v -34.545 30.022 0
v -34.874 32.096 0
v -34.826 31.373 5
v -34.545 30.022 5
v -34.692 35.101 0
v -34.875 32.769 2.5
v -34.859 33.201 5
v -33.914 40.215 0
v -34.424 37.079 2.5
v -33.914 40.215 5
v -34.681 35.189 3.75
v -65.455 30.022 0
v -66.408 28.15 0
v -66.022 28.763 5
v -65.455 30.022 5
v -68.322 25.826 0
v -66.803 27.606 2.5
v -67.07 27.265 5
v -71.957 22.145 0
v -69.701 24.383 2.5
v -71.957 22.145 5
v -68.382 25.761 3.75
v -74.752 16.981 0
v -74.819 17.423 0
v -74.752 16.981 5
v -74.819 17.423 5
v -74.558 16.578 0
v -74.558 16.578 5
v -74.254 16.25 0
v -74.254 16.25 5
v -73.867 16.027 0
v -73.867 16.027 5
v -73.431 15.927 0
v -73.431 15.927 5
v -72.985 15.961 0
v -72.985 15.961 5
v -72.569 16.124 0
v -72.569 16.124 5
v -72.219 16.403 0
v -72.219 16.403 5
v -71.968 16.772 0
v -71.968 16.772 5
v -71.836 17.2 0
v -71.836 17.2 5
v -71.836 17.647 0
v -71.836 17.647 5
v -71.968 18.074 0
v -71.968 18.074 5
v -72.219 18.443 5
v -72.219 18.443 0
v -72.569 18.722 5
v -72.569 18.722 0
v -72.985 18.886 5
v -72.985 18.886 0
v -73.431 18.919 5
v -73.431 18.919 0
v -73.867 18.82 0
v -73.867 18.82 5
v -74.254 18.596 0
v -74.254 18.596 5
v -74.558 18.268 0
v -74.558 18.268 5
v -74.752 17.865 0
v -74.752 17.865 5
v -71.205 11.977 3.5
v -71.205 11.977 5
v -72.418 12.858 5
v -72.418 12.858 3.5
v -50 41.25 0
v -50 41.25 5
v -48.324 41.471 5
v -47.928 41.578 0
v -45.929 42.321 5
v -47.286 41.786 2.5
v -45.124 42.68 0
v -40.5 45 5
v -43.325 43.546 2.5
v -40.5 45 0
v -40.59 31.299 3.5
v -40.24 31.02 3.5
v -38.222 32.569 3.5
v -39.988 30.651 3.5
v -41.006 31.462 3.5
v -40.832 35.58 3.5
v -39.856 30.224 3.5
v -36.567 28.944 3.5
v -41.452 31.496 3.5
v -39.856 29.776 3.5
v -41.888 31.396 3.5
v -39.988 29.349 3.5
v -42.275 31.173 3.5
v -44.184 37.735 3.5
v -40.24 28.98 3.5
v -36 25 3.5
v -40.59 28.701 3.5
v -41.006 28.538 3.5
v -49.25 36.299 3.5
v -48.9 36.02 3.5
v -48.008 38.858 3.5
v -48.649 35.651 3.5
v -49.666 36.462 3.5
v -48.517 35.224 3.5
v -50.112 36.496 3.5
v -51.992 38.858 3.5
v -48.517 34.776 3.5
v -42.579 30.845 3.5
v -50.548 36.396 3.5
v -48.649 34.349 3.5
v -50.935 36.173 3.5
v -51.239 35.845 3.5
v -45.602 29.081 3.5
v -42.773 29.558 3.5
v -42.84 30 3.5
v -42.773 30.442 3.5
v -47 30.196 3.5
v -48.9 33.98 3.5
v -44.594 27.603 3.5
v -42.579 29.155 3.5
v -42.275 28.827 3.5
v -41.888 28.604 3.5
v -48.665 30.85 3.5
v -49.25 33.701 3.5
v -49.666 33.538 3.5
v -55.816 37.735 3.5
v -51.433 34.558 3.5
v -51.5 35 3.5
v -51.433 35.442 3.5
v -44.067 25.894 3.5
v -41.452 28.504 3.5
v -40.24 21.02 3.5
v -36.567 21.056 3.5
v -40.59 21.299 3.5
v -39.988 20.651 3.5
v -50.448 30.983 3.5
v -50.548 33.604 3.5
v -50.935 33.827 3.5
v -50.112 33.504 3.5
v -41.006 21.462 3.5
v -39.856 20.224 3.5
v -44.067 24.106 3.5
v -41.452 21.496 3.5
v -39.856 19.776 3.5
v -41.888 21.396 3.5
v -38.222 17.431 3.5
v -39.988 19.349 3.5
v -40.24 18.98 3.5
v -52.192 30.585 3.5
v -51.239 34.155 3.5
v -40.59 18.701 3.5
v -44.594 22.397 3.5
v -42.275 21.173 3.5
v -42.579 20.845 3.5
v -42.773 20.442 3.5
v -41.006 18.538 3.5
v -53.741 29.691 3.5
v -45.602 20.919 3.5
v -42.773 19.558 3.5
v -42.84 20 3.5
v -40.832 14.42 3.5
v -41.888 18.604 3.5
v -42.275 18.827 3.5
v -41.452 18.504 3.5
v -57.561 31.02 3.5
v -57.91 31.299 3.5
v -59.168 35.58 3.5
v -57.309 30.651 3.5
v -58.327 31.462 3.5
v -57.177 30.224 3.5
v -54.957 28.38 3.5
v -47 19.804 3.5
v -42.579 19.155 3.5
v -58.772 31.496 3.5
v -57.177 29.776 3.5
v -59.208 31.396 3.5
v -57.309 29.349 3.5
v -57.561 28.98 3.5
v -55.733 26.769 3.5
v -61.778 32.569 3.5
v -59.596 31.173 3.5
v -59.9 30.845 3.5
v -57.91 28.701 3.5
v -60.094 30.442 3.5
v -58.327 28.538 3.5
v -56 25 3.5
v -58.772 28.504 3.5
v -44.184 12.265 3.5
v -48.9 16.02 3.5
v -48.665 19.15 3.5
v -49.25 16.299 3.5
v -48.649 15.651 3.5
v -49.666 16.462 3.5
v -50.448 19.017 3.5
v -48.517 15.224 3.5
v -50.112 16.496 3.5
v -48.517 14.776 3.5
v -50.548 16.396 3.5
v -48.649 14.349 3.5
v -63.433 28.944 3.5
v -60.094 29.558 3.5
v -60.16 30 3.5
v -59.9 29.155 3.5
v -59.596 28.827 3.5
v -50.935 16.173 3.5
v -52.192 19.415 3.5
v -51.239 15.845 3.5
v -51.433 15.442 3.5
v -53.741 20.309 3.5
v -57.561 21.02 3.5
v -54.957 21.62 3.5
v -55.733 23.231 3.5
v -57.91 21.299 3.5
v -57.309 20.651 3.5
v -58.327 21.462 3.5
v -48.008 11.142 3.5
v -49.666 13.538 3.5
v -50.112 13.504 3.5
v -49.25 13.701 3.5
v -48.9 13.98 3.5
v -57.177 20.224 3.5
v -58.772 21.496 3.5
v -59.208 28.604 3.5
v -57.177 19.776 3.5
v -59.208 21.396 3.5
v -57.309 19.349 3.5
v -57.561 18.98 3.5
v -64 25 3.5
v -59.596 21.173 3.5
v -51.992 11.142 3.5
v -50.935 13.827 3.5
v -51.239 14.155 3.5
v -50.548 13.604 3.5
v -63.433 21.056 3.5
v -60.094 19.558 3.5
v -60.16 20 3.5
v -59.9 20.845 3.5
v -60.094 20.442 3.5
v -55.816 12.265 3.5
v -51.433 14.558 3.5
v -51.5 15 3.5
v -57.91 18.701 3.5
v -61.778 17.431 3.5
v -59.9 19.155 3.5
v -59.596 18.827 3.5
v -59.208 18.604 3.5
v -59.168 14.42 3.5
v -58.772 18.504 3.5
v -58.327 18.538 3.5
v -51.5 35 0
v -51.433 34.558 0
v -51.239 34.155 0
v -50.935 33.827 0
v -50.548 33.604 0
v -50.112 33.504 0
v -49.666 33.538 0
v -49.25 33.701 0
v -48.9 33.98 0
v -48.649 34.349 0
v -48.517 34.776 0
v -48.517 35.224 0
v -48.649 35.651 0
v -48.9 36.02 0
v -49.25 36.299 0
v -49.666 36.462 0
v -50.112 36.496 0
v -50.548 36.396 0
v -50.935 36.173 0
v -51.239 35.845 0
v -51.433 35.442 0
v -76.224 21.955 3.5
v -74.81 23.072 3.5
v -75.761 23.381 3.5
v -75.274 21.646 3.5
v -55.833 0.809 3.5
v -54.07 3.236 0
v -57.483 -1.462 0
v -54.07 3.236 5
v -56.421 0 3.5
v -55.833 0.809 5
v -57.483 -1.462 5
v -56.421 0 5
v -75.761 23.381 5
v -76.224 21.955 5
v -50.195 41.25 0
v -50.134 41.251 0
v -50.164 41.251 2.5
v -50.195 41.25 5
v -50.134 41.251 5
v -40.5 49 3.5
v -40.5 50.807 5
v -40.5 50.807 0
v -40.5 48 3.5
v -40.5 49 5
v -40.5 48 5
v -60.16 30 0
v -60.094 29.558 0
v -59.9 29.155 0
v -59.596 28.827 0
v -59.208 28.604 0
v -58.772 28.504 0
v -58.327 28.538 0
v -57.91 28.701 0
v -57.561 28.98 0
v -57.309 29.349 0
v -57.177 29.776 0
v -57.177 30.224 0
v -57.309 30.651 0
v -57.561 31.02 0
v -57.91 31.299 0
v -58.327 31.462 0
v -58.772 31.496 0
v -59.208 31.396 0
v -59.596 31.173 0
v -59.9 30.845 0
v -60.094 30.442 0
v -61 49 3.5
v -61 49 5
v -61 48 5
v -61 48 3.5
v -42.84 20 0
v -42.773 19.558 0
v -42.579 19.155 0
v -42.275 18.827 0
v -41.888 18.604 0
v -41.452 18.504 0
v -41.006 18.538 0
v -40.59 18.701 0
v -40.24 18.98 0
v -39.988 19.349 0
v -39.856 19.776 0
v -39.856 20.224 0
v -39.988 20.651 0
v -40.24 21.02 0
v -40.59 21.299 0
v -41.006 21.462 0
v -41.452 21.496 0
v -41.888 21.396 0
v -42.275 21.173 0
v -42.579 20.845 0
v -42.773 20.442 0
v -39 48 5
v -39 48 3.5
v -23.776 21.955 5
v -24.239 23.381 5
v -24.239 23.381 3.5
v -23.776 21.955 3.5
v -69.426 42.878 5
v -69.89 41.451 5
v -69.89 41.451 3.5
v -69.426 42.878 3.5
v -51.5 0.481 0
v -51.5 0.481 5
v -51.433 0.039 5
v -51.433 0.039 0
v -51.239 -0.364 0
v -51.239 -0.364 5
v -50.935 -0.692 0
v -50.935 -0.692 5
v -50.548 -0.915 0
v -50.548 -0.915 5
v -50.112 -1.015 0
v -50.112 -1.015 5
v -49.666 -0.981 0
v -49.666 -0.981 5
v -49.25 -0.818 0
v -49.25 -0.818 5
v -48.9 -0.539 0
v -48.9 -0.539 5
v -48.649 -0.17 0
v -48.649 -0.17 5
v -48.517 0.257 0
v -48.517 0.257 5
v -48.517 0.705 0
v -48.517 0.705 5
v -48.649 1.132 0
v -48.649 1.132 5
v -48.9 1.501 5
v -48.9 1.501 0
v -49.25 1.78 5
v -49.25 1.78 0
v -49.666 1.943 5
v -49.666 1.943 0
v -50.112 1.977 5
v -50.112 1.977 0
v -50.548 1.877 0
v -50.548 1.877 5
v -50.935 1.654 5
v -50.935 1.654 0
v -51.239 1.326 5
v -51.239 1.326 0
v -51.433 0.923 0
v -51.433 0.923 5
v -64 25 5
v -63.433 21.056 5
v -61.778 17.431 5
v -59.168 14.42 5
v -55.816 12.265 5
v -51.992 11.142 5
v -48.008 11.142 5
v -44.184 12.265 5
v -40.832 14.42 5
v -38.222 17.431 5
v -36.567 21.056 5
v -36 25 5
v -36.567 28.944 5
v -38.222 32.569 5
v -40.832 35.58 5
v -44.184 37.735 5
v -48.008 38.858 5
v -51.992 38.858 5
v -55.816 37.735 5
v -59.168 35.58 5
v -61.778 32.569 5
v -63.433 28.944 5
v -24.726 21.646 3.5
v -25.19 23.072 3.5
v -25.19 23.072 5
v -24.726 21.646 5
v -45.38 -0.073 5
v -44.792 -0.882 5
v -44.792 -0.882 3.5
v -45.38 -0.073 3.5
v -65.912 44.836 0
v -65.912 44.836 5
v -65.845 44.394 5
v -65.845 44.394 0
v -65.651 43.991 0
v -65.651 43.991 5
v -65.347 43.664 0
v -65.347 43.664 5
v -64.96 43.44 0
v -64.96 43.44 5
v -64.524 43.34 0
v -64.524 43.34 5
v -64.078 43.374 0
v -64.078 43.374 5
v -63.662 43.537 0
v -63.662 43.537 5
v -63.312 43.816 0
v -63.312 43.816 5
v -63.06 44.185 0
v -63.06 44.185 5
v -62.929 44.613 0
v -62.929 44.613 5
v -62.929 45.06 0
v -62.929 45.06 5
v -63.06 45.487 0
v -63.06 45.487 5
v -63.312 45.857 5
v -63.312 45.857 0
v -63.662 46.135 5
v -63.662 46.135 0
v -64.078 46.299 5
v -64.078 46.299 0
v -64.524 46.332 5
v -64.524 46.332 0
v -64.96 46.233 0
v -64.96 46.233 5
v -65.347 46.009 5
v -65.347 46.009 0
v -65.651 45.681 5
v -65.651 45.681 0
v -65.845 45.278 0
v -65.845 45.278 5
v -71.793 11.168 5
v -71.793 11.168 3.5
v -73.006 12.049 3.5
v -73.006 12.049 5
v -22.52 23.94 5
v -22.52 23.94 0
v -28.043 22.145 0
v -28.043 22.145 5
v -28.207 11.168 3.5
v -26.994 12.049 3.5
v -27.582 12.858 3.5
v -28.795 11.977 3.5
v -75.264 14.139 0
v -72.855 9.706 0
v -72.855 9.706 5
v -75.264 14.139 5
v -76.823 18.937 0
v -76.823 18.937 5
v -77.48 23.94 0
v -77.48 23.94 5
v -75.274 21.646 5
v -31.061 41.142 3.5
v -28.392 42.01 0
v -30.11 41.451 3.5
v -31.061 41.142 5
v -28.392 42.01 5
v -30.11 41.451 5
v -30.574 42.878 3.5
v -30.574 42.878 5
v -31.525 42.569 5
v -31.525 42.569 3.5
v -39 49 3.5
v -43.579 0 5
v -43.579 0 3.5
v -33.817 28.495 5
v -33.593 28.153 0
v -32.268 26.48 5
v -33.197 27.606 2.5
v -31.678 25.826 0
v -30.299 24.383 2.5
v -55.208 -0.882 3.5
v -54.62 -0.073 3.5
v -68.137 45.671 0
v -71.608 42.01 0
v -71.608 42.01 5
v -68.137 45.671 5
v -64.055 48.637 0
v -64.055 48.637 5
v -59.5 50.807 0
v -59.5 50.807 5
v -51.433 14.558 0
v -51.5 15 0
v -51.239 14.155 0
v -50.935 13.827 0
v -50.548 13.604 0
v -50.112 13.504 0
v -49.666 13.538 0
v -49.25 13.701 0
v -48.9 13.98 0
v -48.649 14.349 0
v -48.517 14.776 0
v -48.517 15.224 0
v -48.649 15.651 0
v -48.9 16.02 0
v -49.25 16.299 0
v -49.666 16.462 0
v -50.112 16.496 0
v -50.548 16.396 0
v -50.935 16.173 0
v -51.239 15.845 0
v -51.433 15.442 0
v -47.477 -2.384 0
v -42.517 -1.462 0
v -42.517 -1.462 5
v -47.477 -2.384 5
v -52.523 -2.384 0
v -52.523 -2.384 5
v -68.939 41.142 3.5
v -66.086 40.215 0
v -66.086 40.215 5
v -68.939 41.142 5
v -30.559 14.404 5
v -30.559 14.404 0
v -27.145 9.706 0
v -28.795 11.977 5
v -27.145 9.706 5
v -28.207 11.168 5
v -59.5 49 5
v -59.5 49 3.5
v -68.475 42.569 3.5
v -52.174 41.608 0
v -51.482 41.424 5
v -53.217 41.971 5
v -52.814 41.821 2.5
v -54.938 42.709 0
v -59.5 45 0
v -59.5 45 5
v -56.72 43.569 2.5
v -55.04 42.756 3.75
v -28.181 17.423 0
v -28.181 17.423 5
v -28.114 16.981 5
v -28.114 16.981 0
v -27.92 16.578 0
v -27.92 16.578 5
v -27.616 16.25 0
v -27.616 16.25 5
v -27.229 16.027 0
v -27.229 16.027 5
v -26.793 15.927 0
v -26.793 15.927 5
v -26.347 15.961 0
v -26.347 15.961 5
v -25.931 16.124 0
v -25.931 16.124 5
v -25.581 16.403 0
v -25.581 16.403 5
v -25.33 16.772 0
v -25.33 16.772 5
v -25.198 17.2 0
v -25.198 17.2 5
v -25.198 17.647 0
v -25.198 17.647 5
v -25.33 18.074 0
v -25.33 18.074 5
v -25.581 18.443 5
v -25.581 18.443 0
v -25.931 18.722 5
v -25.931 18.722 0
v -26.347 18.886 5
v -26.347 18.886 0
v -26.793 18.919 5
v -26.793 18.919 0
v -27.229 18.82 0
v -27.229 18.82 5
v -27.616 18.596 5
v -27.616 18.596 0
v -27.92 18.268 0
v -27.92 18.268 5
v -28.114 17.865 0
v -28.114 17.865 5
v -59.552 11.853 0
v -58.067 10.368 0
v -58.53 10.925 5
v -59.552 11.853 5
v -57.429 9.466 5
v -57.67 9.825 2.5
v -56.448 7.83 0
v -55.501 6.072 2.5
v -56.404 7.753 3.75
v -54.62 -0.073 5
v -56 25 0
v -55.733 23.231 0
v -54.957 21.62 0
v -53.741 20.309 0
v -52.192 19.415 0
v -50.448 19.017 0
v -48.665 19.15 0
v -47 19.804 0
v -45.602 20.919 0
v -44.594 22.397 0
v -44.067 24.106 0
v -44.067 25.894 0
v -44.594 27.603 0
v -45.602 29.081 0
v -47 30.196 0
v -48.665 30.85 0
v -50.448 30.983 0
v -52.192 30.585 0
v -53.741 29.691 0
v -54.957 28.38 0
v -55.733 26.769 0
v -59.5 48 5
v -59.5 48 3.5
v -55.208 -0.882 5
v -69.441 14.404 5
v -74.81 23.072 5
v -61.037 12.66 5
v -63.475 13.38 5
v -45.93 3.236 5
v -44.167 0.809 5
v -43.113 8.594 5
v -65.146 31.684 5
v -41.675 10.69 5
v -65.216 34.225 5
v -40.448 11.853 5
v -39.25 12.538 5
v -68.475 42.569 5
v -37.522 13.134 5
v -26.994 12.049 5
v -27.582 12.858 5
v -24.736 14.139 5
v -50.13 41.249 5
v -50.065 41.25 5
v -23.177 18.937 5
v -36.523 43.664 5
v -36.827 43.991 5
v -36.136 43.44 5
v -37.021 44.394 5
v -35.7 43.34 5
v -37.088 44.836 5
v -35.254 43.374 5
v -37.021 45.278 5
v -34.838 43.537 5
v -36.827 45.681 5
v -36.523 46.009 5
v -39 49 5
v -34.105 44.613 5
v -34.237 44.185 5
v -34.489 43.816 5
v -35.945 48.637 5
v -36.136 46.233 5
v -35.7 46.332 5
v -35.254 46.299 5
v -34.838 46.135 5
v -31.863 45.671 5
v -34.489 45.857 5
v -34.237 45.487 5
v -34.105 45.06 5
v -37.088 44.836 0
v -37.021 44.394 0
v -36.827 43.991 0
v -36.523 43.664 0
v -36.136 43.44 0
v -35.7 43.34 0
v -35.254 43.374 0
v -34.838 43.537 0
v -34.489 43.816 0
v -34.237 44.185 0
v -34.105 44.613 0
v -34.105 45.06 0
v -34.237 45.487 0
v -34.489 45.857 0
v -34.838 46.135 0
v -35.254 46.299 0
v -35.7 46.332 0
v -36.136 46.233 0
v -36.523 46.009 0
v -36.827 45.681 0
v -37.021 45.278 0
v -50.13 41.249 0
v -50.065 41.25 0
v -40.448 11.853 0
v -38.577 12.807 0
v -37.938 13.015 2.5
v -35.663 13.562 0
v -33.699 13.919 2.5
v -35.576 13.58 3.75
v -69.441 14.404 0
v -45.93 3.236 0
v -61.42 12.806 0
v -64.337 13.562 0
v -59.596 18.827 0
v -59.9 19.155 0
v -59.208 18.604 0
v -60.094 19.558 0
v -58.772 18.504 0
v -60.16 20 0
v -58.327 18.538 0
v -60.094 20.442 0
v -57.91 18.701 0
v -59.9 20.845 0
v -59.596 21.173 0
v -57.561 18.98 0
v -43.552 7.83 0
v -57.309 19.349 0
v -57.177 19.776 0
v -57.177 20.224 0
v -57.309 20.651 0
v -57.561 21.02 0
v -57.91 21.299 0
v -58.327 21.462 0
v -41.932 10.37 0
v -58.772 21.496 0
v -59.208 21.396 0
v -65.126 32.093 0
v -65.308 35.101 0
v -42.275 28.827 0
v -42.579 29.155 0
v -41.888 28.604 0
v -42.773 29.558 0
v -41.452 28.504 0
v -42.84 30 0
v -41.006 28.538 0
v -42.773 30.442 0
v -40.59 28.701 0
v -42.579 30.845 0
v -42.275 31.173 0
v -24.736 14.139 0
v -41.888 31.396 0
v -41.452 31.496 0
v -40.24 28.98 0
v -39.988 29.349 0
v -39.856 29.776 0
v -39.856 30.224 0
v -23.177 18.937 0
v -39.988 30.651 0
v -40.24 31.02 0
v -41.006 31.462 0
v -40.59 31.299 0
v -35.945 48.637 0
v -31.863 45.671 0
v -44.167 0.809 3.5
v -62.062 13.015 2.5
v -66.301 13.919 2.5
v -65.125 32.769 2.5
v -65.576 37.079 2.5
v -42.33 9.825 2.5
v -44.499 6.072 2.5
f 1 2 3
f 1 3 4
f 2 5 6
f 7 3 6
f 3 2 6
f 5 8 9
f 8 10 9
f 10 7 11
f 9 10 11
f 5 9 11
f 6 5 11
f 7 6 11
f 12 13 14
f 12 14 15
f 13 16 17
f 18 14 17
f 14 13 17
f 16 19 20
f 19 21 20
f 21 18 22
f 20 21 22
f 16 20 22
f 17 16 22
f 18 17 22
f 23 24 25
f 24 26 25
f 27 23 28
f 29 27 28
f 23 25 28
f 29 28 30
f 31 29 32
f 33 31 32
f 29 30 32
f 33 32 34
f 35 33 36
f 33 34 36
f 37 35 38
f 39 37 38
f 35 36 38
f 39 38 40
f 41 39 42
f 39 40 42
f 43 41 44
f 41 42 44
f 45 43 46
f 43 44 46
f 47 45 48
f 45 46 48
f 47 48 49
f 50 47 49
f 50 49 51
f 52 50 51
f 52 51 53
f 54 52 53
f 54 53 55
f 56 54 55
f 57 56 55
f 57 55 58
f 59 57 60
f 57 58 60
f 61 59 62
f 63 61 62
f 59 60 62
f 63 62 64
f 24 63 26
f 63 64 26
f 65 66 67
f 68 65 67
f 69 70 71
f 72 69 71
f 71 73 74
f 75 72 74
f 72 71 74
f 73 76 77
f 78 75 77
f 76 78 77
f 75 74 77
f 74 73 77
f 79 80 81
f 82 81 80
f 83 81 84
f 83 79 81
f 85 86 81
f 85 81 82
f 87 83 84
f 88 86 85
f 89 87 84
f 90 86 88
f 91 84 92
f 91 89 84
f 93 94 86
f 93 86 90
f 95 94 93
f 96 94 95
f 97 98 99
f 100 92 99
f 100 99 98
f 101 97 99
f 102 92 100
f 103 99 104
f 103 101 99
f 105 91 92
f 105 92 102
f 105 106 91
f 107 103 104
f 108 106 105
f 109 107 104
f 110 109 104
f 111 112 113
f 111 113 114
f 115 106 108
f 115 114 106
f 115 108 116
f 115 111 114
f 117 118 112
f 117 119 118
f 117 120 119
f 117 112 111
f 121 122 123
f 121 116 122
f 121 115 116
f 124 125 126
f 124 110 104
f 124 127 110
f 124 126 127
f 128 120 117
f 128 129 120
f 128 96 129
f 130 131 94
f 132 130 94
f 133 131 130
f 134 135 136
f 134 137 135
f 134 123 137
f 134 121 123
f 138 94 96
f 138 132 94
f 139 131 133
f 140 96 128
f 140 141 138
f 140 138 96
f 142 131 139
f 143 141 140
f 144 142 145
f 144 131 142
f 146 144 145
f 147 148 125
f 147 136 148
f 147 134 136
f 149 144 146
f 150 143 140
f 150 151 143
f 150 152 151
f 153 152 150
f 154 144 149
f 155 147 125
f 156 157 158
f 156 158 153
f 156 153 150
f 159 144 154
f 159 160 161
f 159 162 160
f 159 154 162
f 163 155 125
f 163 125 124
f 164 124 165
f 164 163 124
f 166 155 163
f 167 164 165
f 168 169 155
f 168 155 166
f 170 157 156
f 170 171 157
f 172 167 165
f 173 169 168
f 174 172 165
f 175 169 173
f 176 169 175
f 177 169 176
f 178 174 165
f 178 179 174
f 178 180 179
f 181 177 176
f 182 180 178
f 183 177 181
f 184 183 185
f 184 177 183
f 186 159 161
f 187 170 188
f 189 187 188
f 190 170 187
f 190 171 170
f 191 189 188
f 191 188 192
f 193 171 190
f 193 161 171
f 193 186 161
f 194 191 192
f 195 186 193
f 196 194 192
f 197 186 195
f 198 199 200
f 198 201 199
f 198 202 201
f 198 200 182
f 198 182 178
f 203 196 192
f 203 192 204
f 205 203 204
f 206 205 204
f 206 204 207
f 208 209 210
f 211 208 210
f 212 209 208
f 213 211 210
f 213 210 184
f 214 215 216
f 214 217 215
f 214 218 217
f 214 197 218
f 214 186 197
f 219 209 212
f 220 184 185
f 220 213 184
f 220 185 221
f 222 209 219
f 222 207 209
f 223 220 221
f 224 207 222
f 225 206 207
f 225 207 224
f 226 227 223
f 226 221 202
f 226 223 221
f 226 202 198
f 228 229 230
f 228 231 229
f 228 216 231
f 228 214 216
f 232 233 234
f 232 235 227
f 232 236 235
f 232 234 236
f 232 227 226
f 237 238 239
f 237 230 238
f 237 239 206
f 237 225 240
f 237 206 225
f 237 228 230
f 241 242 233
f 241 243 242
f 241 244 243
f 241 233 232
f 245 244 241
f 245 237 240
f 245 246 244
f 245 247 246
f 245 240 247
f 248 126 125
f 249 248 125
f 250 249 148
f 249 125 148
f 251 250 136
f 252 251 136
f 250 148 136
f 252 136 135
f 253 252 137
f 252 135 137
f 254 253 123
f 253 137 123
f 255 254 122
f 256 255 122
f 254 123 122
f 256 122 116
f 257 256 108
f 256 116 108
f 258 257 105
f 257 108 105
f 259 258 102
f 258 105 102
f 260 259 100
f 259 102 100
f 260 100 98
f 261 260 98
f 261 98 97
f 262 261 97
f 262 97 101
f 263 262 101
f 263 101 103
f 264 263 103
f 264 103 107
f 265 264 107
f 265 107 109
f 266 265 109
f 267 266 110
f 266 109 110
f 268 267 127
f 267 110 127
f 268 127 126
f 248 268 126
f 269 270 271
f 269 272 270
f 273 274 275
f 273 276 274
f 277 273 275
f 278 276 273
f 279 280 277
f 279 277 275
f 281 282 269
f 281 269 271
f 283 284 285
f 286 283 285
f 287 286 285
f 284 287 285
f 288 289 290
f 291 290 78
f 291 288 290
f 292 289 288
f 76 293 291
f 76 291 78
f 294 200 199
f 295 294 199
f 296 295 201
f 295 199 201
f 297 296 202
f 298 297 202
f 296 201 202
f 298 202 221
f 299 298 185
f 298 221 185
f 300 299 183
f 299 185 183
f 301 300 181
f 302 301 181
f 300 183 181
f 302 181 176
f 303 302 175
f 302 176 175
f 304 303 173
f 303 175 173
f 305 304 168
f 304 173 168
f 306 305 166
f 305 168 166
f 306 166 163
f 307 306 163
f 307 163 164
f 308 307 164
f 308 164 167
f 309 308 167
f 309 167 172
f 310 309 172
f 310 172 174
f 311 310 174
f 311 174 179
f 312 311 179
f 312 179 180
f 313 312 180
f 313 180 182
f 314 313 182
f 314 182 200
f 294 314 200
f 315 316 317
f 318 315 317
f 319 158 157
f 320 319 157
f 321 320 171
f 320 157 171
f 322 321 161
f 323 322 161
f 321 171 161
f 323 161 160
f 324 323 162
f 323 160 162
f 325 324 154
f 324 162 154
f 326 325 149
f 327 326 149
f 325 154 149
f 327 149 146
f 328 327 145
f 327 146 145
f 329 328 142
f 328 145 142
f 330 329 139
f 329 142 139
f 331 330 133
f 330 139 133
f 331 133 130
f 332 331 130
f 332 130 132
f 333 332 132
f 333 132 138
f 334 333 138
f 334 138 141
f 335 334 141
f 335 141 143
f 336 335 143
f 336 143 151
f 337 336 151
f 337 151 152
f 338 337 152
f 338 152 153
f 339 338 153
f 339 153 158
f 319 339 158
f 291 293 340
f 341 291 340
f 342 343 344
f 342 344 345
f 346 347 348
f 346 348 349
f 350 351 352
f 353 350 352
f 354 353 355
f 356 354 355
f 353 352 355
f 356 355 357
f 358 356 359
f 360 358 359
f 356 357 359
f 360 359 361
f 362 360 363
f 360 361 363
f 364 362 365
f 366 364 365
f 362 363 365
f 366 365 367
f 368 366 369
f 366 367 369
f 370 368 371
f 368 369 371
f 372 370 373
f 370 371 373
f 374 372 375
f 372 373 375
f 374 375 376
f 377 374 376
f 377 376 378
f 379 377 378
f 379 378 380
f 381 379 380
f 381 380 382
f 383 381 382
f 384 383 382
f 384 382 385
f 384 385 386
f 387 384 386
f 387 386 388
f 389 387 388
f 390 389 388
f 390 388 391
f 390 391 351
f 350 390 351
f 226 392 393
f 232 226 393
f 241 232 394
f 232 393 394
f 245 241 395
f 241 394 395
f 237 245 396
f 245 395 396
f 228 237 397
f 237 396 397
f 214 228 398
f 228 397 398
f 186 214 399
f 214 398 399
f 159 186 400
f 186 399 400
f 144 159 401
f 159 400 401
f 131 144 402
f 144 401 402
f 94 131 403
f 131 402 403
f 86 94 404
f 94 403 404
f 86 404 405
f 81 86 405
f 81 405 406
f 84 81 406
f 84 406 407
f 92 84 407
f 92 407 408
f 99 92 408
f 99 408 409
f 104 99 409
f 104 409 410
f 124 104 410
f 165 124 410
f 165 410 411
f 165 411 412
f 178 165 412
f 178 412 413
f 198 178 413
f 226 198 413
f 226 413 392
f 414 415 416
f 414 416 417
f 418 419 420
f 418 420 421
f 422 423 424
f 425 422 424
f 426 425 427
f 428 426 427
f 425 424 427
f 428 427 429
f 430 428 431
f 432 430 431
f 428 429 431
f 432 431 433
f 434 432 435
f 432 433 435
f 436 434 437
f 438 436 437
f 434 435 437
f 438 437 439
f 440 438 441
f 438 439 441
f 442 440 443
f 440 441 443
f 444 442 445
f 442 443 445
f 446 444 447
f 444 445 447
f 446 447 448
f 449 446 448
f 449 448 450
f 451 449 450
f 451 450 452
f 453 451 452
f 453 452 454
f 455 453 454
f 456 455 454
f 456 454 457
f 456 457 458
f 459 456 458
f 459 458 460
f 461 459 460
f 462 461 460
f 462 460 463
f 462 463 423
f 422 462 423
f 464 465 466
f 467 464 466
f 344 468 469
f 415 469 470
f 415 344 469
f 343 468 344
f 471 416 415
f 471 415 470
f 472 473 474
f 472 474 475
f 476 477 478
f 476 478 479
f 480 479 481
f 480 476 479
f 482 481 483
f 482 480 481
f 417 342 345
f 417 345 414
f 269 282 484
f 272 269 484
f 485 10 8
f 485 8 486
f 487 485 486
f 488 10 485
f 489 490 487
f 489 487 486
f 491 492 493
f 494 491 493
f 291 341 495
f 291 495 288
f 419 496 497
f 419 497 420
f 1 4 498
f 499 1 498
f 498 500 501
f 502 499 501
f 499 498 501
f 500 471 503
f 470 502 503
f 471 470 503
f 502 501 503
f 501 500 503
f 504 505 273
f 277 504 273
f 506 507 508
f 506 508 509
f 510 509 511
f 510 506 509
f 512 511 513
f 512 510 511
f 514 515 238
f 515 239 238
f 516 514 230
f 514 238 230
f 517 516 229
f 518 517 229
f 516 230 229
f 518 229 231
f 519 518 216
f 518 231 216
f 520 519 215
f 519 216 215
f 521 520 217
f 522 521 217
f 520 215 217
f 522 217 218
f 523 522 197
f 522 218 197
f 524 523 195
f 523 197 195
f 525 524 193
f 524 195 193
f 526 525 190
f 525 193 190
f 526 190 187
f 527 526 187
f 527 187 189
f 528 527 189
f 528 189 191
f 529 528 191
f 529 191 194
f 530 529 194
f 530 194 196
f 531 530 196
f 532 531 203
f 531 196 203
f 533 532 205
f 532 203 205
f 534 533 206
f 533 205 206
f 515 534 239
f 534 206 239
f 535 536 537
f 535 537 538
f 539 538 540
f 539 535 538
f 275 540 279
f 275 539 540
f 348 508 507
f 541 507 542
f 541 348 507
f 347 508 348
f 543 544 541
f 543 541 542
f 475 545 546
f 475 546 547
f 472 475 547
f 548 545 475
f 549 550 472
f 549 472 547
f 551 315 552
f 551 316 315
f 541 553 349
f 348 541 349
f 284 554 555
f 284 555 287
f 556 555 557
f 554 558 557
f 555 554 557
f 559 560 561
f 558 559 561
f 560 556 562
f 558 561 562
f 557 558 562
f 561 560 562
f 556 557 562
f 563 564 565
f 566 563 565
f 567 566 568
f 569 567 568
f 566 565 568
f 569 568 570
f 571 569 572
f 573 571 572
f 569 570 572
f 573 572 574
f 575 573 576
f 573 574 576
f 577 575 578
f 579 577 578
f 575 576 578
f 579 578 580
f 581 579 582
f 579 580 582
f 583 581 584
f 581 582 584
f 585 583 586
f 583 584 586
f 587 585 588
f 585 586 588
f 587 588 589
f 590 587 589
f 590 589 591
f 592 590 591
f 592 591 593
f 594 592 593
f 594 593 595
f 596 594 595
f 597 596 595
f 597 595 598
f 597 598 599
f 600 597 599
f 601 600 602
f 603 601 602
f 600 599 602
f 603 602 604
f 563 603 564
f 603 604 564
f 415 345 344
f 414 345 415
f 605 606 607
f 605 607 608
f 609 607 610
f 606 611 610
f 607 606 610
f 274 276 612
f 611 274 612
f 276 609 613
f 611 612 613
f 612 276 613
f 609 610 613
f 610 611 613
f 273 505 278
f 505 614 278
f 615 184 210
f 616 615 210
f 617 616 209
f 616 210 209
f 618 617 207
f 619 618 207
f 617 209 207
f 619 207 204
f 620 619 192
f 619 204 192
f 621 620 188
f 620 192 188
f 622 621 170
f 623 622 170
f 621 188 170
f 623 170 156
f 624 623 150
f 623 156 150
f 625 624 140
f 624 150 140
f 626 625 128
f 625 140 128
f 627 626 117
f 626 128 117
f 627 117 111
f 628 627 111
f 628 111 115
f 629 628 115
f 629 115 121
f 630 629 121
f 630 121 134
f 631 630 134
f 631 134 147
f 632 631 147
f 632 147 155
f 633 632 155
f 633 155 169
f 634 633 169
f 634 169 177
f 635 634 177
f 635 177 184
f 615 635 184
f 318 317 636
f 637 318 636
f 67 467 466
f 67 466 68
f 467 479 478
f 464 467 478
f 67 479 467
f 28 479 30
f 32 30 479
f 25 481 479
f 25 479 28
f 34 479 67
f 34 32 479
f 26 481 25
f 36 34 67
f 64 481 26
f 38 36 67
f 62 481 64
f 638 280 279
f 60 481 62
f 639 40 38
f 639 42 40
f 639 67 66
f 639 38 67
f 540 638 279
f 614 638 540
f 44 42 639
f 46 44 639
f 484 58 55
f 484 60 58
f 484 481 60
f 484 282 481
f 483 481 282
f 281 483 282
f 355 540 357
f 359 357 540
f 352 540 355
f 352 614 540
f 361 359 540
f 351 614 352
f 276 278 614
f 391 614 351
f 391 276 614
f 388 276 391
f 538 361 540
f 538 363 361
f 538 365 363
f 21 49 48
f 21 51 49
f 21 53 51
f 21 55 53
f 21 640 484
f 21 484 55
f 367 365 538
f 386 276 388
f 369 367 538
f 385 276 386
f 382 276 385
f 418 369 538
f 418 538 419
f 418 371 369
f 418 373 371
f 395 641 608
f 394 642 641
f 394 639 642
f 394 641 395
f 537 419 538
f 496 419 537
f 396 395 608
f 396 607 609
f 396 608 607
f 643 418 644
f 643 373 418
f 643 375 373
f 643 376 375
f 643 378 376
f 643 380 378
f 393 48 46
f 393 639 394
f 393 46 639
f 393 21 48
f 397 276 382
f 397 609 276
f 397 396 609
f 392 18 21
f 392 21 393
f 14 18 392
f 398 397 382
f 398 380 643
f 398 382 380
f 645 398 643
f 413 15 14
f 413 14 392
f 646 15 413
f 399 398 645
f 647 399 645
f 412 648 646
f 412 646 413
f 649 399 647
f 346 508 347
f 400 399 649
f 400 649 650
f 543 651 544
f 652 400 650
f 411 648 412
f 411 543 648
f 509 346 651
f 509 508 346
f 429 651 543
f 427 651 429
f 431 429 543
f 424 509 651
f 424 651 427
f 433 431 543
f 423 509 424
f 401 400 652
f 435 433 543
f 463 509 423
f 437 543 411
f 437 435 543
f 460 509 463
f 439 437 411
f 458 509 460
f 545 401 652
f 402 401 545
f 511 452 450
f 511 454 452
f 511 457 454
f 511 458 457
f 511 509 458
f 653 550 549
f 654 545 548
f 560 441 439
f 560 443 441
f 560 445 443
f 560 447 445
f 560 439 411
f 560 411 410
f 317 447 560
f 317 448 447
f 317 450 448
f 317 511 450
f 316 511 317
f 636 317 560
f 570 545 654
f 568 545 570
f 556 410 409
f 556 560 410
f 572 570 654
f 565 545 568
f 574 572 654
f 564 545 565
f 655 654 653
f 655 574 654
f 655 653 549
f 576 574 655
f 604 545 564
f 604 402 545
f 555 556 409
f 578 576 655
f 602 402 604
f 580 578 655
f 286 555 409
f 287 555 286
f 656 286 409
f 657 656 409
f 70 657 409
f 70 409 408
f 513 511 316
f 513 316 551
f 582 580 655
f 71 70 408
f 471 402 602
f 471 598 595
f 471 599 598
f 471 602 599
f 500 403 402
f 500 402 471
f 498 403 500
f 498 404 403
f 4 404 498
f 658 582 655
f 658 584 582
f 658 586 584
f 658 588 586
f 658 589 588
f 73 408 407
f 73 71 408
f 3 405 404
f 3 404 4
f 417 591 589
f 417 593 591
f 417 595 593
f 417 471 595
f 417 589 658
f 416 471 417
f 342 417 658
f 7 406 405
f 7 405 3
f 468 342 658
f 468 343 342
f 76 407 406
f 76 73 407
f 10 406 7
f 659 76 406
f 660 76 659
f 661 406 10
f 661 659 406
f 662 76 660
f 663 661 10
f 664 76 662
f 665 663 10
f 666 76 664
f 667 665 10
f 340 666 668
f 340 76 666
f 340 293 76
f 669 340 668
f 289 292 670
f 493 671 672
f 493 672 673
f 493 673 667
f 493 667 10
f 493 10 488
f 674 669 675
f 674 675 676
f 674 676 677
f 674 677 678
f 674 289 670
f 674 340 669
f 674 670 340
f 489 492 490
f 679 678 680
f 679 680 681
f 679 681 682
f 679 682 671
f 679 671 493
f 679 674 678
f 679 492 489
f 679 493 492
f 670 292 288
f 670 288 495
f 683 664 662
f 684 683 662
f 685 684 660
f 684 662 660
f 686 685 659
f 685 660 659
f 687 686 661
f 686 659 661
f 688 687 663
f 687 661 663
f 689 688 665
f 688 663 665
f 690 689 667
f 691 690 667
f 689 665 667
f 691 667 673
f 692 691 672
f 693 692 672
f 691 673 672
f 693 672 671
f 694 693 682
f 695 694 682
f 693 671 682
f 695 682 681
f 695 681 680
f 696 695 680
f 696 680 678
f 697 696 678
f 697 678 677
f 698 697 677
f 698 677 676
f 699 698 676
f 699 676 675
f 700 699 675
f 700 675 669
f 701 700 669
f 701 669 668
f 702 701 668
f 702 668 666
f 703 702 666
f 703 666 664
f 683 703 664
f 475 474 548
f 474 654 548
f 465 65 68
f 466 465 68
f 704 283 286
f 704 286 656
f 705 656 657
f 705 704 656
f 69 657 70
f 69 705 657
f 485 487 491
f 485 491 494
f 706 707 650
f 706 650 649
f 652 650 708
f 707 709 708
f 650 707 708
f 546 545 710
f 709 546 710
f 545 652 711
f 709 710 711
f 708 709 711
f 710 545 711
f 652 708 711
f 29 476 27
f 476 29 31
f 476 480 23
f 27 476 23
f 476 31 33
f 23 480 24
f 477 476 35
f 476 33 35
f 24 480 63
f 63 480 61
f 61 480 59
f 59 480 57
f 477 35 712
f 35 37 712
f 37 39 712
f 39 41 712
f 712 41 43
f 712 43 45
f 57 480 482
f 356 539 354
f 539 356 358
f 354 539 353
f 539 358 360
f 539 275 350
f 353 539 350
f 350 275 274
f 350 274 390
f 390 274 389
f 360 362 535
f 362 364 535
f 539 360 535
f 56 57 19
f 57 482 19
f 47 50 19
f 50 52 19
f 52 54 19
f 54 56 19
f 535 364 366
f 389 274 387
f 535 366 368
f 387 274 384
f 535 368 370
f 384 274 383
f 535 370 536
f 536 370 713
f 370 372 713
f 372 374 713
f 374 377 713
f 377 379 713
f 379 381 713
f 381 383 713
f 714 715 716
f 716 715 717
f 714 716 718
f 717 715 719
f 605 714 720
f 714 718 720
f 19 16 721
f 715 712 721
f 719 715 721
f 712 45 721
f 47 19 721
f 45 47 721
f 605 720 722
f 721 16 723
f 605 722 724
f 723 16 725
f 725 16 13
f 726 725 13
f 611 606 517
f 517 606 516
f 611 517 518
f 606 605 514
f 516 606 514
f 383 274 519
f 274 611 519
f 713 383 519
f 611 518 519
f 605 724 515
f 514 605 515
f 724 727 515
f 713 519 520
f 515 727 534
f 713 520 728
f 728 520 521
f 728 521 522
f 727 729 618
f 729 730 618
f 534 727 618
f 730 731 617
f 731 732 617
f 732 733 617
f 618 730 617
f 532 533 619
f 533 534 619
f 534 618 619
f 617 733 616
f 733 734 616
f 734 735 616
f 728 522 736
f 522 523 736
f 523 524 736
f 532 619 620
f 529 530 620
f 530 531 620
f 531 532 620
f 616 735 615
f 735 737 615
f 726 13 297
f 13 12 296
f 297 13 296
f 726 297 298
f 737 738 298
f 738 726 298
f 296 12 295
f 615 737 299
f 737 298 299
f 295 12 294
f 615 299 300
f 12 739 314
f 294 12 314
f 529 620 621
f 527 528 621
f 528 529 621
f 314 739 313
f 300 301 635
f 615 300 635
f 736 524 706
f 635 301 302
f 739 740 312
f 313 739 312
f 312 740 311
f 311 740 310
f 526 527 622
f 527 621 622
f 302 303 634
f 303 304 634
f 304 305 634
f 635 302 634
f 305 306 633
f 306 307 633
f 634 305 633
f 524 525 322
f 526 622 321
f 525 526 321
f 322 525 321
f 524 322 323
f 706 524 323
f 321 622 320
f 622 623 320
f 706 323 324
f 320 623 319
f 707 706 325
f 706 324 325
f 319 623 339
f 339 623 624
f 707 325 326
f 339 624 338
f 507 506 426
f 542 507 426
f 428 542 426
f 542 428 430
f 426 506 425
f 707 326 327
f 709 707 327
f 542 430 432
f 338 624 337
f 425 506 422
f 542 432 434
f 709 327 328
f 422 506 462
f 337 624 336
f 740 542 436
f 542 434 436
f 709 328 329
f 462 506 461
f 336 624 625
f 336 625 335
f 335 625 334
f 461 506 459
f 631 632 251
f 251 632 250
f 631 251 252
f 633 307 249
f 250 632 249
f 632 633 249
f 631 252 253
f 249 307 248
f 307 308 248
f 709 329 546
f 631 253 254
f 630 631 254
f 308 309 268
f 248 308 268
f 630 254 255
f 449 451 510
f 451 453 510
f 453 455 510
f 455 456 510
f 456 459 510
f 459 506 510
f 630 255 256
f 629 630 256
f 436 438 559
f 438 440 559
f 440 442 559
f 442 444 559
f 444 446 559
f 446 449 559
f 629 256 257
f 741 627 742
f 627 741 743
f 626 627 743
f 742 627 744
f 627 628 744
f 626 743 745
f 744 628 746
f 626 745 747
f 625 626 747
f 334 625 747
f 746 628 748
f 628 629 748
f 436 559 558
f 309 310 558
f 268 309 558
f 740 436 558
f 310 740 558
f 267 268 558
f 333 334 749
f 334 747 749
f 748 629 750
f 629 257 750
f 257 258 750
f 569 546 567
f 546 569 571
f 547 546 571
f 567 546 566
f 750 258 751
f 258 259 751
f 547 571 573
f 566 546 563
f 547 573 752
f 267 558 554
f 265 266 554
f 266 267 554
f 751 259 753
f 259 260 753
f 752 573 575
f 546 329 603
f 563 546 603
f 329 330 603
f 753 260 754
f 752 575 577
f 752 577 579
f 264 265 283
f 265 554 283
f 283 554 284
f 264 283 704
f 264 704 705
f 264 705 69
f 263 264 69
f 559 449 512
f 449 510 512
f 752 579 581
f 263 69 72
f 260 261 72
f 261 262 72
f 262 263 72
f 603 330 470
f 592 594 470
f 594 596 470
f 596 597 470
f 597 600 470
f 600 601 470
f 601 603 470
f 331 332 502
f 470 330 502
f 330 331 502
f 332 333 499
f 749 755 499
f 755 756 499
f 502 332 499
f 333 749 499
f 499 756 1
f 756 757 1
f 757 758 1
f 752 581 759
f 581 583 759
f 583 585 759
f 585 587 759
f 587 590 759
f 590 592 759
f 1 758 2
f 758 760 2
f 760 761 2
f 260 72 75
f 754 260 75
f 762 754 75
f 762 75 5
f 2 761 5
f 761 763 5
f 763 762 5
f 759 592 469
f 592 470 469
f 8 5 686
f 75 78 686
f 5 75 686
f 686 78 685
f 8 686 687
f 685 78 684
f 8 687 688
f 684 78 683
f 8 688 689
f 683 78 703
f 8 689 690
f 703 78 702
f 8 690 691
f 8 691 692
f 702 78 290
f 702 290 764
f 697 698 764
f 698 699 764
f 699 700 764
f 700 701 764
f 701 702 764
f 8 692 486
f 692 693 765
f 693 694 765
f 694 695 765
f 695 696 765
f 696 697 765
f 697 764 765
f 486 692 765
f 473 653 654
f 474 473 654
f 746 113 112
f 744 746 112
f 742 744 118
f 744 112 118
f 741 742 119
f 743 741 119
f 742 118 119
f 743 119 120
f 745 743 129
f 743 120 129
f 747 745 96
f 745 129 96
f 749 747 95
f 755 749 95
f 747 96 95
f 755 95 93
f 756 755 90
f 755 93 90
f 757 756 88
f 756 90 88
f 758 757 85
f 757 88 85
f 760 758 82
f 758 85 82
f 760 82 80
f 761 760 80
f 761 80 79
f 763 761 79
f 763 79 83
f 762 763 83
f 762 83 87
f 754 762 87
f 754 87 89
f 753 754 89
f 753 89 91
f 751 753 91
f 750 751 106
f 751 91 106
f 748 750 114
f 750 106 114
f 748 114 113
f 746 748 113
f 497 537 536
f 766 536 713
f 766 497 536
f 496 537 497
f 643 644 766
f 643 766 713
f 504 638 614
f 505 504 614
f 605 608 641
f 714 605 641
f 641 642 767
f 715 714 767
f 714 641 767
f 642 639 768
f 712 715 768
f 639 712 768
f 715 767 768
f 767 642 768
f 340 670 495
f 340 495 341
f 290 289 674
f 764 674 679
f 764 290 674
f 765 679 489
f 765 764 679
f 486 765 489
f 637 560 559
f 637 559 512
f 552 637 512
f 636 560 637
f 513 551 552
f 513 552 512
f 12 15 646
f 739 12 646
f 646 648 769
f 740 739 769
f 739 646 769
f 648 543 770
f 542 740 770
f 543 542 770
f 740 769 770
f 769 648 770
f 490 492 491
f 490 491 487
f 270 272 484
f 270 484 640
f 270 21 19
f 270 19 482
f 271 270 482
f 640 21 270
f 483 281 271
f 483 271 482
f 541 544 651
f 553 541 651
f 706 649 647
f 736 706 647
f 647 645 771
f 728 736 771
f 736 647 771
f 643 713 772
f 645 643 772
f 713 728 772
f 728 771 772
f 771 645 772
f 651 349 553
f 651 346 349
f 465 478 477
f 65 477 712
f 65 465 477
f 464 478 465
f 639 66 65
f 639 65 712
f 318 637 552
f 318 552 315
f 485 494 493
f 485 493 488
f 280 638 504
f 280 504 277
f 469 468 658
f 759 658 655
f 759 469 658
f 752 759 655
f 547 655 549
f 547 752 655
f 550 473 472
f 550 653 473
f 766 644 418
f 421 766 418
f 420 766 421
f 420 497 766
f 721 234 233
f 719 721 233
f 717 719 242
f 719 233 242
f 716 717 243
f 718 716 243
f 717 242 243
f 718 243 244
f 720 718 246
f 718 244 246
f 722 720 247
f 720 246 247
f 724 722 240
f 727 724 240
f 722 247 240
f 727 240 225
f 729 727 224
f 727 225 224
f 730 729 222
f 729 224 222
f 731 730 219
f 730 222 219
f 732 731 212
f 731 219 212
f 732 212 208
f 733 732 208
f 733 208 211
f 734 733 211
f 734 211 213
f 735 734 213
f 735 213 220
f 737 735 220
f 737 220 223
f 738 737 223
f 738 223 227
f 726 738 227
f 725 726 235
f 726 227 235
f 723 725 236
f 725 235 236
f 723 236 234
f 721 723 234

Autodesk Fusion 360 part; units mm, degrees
sketch "Sketch3" plane through (0, 0, 0) normal (0, 0, 1) x (1, 0, 0)
  circle A0 centre (-50, 25) radius 27.5
  line L0 (-40.5, 45) -> (-40.5, 60)
  line L1 (-59.5, 60) -> (-59.5, 45)
  line L2 (-50, 25) -> (-50, 55)
  circle A1 centre (-50, 25) radius 16.25
  spline S0 degree 2 poles (-59.5, 45) (-50.3564, 40) (-40.5, 45) knots 0 0 0 2.042764 2.042764 2.042764 weights 1 3 1
  dimension "d9" = 55
  dimension "d10" = 32.5
extrude "Extrude3" add sketch "Sketch3" along normal blind 5
sketch "Sketch4" plane through (0, 0, 5) normal (0, 0, 1) x (-1, 0, 0)
  circle A0 centre (50, -25) radius 27.5
  line L0 (50, -25) -> (50, -61)
  line L1 (59.5, -45) -> (59.5, -62)
  line L2 (40.5, -62) -> (40.5, -45)
  circle A1 centre (50, -25) radius 16.25
  spline S0 degree 2 poles (59.5, -45) (50, -40) (40.5, -45) knots 0 0 0 2.04267 2.04267 2.04267 weights 1 3 1
  line L3 (82.2534, -45.4687) -> (66.0855, -40.2154)
  spline S1 degree 2 poles (71.9568, -22.1453) (64.2658, -29.6353) (66.0855, -40.2154) knots 0 0 0 2.04267 2.04267 2.04267 weights 1 3 1
  line L4 (71.9568, -22.1453) -> (88.1248, -27.3986)
  line L5 (50, -25) -> (84.238, -36.1246)
  line L6 (79.4337, -0.6503) -> (69.4414, -14.4036)
  spline S2 degree 2 poles (54.07, -3.2357) (58.8168, -12.8647) (69.4414, -14.4036) knots 0 0 0 2.04267 2.04267 2.04267 weights 1 3 1
  line L7 (54.07, -3.2357) -> (64.0624, 10.5176)
  line L8 (50, -25) -> (71.1603, 4.1246)
  line L9 (35.9376, 10.5176) -> (45.93, -3.2357)
  spline S3 degree 2 poles (30.5586, -14.4036) (41.1832, -12.8647) (45.93, -3.2357) knots 0 0 0 2.04267 2.04267 2.04267 weights 1 3 1
  line L10 (30.5586, -14.4036) -> (20.5663, -0.6503)
  line L11 (50, -25) -> (28.8397, 4.1246)
  line L12 (11.8752, -27.3986) -> (28.0432, -22.1453)
  spline S4 degree 2 poles (33.9145, -40.2154) (35.7342, -29.6353) (28.0432, -22.1453) knots 0 0 0 2.04267 2.04267 2.04267 weights 1 3 1
  line L13 (33.9145, -40.2154) -> (17.7466, -45.4687)
  line L14 (50, -25) -> (15.762, -36.1246)
  dimension "d14" = 32.5
  dimension "d21" = 360
extrude "Extrude4" cut sketch "Sketch4" against normal blind 30 contours A0 S1 L4 L5 | A0 L3 S1 L5 | A0 L6 S2 L8 | A0 S2 L7 L8 | A0 L0 L1 S0 | A0 L0 L2 S0 | A0 L12 S4 L14 | A0 S4 L13 L14 | A0 L9 S3 L11 | A0 S3 L10 L11
sketch "Sketch5" plane through (0, 0, 5) normal (0, 0, 1) x (-1, 0, 0)
  line L0 (71.9568, -22.1453) -> (77.4796, -23.9398)
  arc A0 (77.4796, -23.9398) -> (72.8546, -9.7057) centre (50, -25) ccw
  line L1 (72.8546, -9.7057) -> (69.4414, -14.4036)
  spline S0 degree 2 poles (69.4414, -14.4036) (58.8168, -12.8647) (54.07, -3.2357) knots -2.04267 -2.04267 -2.04267 0 0 0 weights 1 3 1
  line L2 (54.07, -3.2357) -> (57.4833, 1.4622)
  arc A1 (57.4833, 1.4622) -> (42.5167, 1.4622) centre (50, -25) ccw
  line L3 (42.5167, 1.4622) -> (45.93, -3.2357)
  spline S1 degree 2 poles (45.93, -3.2357) (41.1832, -12.8647) (30.5586, -14.4036) knots -2.04267 -2.04267 -2.04267 0 0 0 weights 1 3 1
  line L4 (30.5586, -14.4036) -> (27.1454, -9.7057)
  arc A2 (27.1454, -9.7057) -> (22.5204, -23.9398) centre (50, -25) ccw
  line L5 (22.5204, -23.9398) -> (28.0432, -22.1453)
  spline S2 degree 2 poles (28.0432, -22.1453) (35.7342, -29.6353) (33.9145, -40.2154) knots -2.04267 -2.04267 -2.04267 0 0 0 weights 1 3 1
  line L6 (33.9145, -40.2154) -> (28.3918, -42.0098)
  arc A3 (28.3918, -42.0098) -> (40.5, -50.807) centre (50, -25) ccw
  line L7 (40.5, -50.807) -> (40.5, -45)
  spline S3 degree 2 poles (40.5, -45) (50, -40) (59.5, -45) knots -2.04267 -2.04267 -2.04267 0 0 0 weights 1 3 1
  line L8 (59.5, -45) -> (59.5, -50.807)
  arc A4 (59.5, -50.807) -> (71.6082, -42.0098) centre (50, -25) ccw
  line L9 (71.6082, -42.0098) -> (66.0855, -40.2154)
  spline S4 degree 2 poles (66.0855, -40.2154) (64.2658, -29.6353) (71.9568, -22.1453) knots -2.04267 -2.04267 -2.04267 0 0 0 weights 1 3 1
  circle A5 centre (50, -25) radius 10
  circle A6 centre (50, -35) radius 1.5
  circle A7 centre (58.6603, -30) radius 1.5
  circle A8 centre (58.6603, -20) radius 1.5
  circle A9 centre (50, -15) radius 1.5
  circle A10 centre (41.3397, -20) radius 1.5
  circle A11 centre (41.3397, -30) radius 1.5
  circle A12 centre (50, -25) radius 6
  line L10 (50, -25) -> (33.8359, -47.248)
  circle A13 centre (35.5881, -44.8363) radius 1.5
  circle A14 centre (64.4119, -44.8363) radius 1.5
  circle A15 centre (73.319, -17.4232) radius 1.5
  circle A16 centre (50, -0.481) radius 1.5
  circle A17 centre (26.681, -17.4232) radius 1.5
  dimension "d24" = 20
  dimension "d25" = 3
  dimension "d27" = 360
  dimension "d28" = 3
  dimension "d30" = 360
extrude "Extrude5" cut sketch "Sketch5" against normal blind 5 contours A5 A8 | A5 A8 | A5 A7 | A5 A7 | A5 A9 | A5 A9 | A5 A6 | A5 A6 | A5 A10 | A5 A10 | A5 A11 | A5 A11 | A12 | L10 A13 | L10 A13 | A14 | A15 | A16 | A17
sketch "Sketch6" plane through (0, 0, 5) normal (0, 0, 1) x (-1, 0, 0)
  line L0 (71.9568, -22.1453) -> (77.4796, -23.9398)
  arc A0 (77.4796, -23.9398) -> (72.8546, -9.7057) centre (50, -25) ccw
  line L1 (72.8546, -9.7057) -> (69.4414, -14.4036)
  spline S0 degree 2 poles (69.4414, -14.4036) (58.8168, -12.8647) (54.07, -3.2357) knots -2.04267 -2.04267 -2.04267 0 0 0 weights 1 3 1
  line L2 (54.07, -3.2357) -> (57.4833, 1.4622)
  arc A1 (57.4833, 1.4622) -> (42.5167, 1.4622) centre (50, -25) ccw
  line L3 (42.5167, 1.4622) -> (45.93, -3.2357)
  spline S1 degree 2 poles (45.93, -3.2357) (41.1832, -12.8647) (30.5586, -14.4036) knots -2.04267 -2.04267 -2.04267 0 0 0 weights 1 3 1
  line L4 (30.5586, -14.4036) -> (27.1454, -9.7057)
  arc A2 (27.1454, -9.7057) -> (22.5204, -23.9398) centre (50, -25) ccw
  line L5 (22.5204, -23.9398) -> (28.0432, -22.1453)
  spline S2 degree 2 poles (28.0432, -22.1453) (35.7342, -29.6353) (33.9145, -40.2154) knots -2.04267 -2.04267 -2.04267 0 0 0 weights 1 3 1
  line L6 (33.9145, -40.2154) -> (28.3918, -42.0098)
  arc A3 (28.3918, -42.0098) -> (40.5, -50.807) centre (50, -25) ccw
  line L7 (40.5, -50.807) -> (40.5, -45)
  spline S3 degree 2 poles (40.5, -45) (50, -40) (59.5, -45) knots -2.04267 -2.04267 -2.04267 0 0 0 weights 1 3 1
  line L8 (59.5, -45) -> (59.5, -50.807)
  arc A4 (59.5, -50.807) -> (71.6082, -42.0098) centre (50, -25) ccw
  line L9 (71.6082, -42.0098) -> (66.0855, -40.2154)
  spline S4 degree 2 poles (66.0855, -40.2154) (64.2658, -29.6353) (71.9568, -22.1453) knots -2.04267 -2.04267 -2.04267 0 0 0 weights 1 3 1
  circle A5 centre (50, -0.481) radius 1.5
  circle A6 centre (35.5881, -44.8363) radius 1.5
  circle A7 centre (58.6603, -30) radius 1.5
  circle A8 centre (50, -25) radius 6
  circle A9 centre (58.6603, -20) radius 1.5
  circle A10 centre (64.4119, -44.8363) radius 1.5
  circle A11 centre (26.681, -17.4232) radius 1.5
  circle A12 centre (41.3397, -20) radius 1.5
  circle A13 centre (50, -35) radius 1.5
  circle A14 centre (41.3397, -30) radius 1.5
  circle A15 centre (50, -15) radius 1.5
  circle A16 centre (73.319, -17.4232) radius 1.5
  circle A17 centre (50, -25) radius 14
  dimension "d33" = 28
extrude "Extrude6" cut sketch "Sketch6" against normal blind 1.5 contours A17
sketch "Sketch7" plane through (0, 0, 5) normal (0, 0, 1) x (-1, 0, 0)
  circle A0 centre (73.319, -17.4232) radius 1.5
  circle A1 centre (26.681, -17.4232) radius 1.5
  circle A2 centre (64.4119, -44.8363) radius 1.5
  circle A3 centre (35.5881, -44.8363) radius 1.5
  circle A4 centre (50, -0.481) radius 1.5
  line L0 (71.9568, -22.1453) -> (77.4796, -23.9398)
  arc A5 (77.4796, -23.9398) -> (72.8546, -9.7057) centre (50, -25) ccw
  line L1 (72.8546, -9.7057) -> (69.4414, -14.4036)
  spline S0 degree 2 poles (69.4414, -14.4036) (58.8168, -12.8647) (54.07, -3.2357) knots -2.04267 -2.04267 -2.04267 0 0 0 weights 1 3 1
  line L2 (54.07, -3.2357) -> (57.4833, 1.4622)
  arc A6 (57.4833, 1.4622) -> (42.5167, 1.4622) centre (50, -25) ccw
  line L3 (42.5167, 1.4622) -> (45.93, -3.2357)
  spline S1 degree 2 poles (45.93, -3.2357) (41.1832, -12.8647) (30.5586, -14.4036) knots -2.04267 -2.04267 -2.04267 0 0 0 weights 1 3 1
  line L4 (30.5586, -14.4036) -> (27.1454, -9.7057)
  arc A7 (27.1454, -9.7057) -> (22.5204, -23.9398) centre (50, -25) ccw
  line L5 (22.5204, -23.9398) -> (28.0432, -22.1453)
  spline S2 degree 2 poles (28.0432, -22.1453) (35.7342, -29.6353) (33.9145, -40.2154) knots -2.04267 -2.04267 -2.04267 0 0 0 weights 1 3 1
  line L6 (33.9145, -40.2154) -> (28.3918, -42.0098)
  arc A8 (28.3918, -42.0098) -> (40.5, -50.807) centre (50, -25) ccw
  line L7 (40.5, -50.807) -> (40.5, -45)
  spline S3 degree 2 poles (40.5, -45) (50, -40) (59.5, -45) knots -2.04267 -2.04267 -2.04267 0 0 0 weights 1 3 1
  line L8 (59.5, -45) -> (59.5, -50.807)
  arc A9 (59.5, -50.807) -> (71.6082, -42.0098) centre (50, -25) ccw
  line L9 (71.6082, -42.0098) -> (66.0855, -40.2154)
  spline S4 degree 2 poles (66.0855, -40.2154) (64.2658, -29.6353) (71.9568, -22.1453) knots -2.04267 -2.04267 -2.04267 0 0 0 weights 1 3 1
  circle A10 centre (50, -25) radius 14
  line L10 (61, -48) -> (39, -48)
  line L11 (50, -25) -> (50, -48)
  line L12 (61, -49) -> (39, -49)
  line L13 (39, -49) -> (39, -48)
  line L14 (61, -49) -> (61, -48)
  line L15 (75.2735, -21.6458) -> (68.4751, -42.569)
  line L16 (76.2245, -21.9548) -> (75.2735, -21.6458)
  line L17 (76.2245, -21.9548) -> (69.4262, -42.878)
  line L18 (69.4262, -42.878) -> (68.4751, -42.569)
  line L19 (54.6199, 0.073) -> (72.4182, -12.8582)
  line L20 (55.2077, 0.882) -> (54.6199, 0.073)
  line L21 (55.2077, 0.882) -> (73.006, -12.0492)
  line L22 (73.006, -12.0492) -> (72.4182, -12.8582)
  line L23 (27.5818, -12.8582) -> (45.3801, 0.073)
  line L24 (26.994, -12.0492) -> (27.5818, -12.8582)
  line L25 (26.994, -12.0492) -> (44.7923, 0.882)
  line L26 (44.7923, 0.882) -> (45.3801, 0.073)
  line L27 (31.5249, -42.569) -> (24.7265, -21.6458)
  line L28 (30.5738, -42.878) -> (31.5249, -42.569)
  line L29 (30.5738, -42.878) -> (23.7755, -21.9548)
  line L30 (23.7755, -21.9548) -> (24.7265, -21.6458)
  dimension "d37" = 360
extrude "Extrude7" cut sketch "Sketch7" against normal blind 1.5 contours L0 L15 L16 L17 | L9 L15 L17 L18 | L1 L19 L21 L22 | L2 L19 L20 L21 | L8 L10 L12 L14 | L7 L10 L12 L13 | L3 L23 L25 L26 | L4 L23 L24 L25 | L6 L27 L28 L29 | L5 L27 L29 L30
sketch "Sketch1" plane through (0, 0, 0) normal (0, 0, 1) x (1, 0, 0)
  circle A0 centre (-75, 50) radius 40
extrude "Extrude1" [suppressed]
sketch "Sketch2" plane through (0, 0, 40) normal (0, 0, 1) x (-1, 0, 0)
  circle A0 centre (75, -50) radius 40
  circle A1 centre (75, -50) radius 30
  line L0 (75, -50) -> (56.4216, -73.5551)
  line L1 (75, -50) -> (93.5784, -73.5551)
  line L2 (75, -50) -> (93.5784, -26.4449)
  line L3 (56.4216, -26.0914) -> (75, -50)
extrude "Extrude2" [suppressed]
fillet "Fillet1" [suppressed]
fillet "Fillet2" [suppressed]
equation "d15 = 0.75"
equation "d16 = d15"
equation "d17 = d15"
equation "d18 = d15"
equation "d19 = d15"
